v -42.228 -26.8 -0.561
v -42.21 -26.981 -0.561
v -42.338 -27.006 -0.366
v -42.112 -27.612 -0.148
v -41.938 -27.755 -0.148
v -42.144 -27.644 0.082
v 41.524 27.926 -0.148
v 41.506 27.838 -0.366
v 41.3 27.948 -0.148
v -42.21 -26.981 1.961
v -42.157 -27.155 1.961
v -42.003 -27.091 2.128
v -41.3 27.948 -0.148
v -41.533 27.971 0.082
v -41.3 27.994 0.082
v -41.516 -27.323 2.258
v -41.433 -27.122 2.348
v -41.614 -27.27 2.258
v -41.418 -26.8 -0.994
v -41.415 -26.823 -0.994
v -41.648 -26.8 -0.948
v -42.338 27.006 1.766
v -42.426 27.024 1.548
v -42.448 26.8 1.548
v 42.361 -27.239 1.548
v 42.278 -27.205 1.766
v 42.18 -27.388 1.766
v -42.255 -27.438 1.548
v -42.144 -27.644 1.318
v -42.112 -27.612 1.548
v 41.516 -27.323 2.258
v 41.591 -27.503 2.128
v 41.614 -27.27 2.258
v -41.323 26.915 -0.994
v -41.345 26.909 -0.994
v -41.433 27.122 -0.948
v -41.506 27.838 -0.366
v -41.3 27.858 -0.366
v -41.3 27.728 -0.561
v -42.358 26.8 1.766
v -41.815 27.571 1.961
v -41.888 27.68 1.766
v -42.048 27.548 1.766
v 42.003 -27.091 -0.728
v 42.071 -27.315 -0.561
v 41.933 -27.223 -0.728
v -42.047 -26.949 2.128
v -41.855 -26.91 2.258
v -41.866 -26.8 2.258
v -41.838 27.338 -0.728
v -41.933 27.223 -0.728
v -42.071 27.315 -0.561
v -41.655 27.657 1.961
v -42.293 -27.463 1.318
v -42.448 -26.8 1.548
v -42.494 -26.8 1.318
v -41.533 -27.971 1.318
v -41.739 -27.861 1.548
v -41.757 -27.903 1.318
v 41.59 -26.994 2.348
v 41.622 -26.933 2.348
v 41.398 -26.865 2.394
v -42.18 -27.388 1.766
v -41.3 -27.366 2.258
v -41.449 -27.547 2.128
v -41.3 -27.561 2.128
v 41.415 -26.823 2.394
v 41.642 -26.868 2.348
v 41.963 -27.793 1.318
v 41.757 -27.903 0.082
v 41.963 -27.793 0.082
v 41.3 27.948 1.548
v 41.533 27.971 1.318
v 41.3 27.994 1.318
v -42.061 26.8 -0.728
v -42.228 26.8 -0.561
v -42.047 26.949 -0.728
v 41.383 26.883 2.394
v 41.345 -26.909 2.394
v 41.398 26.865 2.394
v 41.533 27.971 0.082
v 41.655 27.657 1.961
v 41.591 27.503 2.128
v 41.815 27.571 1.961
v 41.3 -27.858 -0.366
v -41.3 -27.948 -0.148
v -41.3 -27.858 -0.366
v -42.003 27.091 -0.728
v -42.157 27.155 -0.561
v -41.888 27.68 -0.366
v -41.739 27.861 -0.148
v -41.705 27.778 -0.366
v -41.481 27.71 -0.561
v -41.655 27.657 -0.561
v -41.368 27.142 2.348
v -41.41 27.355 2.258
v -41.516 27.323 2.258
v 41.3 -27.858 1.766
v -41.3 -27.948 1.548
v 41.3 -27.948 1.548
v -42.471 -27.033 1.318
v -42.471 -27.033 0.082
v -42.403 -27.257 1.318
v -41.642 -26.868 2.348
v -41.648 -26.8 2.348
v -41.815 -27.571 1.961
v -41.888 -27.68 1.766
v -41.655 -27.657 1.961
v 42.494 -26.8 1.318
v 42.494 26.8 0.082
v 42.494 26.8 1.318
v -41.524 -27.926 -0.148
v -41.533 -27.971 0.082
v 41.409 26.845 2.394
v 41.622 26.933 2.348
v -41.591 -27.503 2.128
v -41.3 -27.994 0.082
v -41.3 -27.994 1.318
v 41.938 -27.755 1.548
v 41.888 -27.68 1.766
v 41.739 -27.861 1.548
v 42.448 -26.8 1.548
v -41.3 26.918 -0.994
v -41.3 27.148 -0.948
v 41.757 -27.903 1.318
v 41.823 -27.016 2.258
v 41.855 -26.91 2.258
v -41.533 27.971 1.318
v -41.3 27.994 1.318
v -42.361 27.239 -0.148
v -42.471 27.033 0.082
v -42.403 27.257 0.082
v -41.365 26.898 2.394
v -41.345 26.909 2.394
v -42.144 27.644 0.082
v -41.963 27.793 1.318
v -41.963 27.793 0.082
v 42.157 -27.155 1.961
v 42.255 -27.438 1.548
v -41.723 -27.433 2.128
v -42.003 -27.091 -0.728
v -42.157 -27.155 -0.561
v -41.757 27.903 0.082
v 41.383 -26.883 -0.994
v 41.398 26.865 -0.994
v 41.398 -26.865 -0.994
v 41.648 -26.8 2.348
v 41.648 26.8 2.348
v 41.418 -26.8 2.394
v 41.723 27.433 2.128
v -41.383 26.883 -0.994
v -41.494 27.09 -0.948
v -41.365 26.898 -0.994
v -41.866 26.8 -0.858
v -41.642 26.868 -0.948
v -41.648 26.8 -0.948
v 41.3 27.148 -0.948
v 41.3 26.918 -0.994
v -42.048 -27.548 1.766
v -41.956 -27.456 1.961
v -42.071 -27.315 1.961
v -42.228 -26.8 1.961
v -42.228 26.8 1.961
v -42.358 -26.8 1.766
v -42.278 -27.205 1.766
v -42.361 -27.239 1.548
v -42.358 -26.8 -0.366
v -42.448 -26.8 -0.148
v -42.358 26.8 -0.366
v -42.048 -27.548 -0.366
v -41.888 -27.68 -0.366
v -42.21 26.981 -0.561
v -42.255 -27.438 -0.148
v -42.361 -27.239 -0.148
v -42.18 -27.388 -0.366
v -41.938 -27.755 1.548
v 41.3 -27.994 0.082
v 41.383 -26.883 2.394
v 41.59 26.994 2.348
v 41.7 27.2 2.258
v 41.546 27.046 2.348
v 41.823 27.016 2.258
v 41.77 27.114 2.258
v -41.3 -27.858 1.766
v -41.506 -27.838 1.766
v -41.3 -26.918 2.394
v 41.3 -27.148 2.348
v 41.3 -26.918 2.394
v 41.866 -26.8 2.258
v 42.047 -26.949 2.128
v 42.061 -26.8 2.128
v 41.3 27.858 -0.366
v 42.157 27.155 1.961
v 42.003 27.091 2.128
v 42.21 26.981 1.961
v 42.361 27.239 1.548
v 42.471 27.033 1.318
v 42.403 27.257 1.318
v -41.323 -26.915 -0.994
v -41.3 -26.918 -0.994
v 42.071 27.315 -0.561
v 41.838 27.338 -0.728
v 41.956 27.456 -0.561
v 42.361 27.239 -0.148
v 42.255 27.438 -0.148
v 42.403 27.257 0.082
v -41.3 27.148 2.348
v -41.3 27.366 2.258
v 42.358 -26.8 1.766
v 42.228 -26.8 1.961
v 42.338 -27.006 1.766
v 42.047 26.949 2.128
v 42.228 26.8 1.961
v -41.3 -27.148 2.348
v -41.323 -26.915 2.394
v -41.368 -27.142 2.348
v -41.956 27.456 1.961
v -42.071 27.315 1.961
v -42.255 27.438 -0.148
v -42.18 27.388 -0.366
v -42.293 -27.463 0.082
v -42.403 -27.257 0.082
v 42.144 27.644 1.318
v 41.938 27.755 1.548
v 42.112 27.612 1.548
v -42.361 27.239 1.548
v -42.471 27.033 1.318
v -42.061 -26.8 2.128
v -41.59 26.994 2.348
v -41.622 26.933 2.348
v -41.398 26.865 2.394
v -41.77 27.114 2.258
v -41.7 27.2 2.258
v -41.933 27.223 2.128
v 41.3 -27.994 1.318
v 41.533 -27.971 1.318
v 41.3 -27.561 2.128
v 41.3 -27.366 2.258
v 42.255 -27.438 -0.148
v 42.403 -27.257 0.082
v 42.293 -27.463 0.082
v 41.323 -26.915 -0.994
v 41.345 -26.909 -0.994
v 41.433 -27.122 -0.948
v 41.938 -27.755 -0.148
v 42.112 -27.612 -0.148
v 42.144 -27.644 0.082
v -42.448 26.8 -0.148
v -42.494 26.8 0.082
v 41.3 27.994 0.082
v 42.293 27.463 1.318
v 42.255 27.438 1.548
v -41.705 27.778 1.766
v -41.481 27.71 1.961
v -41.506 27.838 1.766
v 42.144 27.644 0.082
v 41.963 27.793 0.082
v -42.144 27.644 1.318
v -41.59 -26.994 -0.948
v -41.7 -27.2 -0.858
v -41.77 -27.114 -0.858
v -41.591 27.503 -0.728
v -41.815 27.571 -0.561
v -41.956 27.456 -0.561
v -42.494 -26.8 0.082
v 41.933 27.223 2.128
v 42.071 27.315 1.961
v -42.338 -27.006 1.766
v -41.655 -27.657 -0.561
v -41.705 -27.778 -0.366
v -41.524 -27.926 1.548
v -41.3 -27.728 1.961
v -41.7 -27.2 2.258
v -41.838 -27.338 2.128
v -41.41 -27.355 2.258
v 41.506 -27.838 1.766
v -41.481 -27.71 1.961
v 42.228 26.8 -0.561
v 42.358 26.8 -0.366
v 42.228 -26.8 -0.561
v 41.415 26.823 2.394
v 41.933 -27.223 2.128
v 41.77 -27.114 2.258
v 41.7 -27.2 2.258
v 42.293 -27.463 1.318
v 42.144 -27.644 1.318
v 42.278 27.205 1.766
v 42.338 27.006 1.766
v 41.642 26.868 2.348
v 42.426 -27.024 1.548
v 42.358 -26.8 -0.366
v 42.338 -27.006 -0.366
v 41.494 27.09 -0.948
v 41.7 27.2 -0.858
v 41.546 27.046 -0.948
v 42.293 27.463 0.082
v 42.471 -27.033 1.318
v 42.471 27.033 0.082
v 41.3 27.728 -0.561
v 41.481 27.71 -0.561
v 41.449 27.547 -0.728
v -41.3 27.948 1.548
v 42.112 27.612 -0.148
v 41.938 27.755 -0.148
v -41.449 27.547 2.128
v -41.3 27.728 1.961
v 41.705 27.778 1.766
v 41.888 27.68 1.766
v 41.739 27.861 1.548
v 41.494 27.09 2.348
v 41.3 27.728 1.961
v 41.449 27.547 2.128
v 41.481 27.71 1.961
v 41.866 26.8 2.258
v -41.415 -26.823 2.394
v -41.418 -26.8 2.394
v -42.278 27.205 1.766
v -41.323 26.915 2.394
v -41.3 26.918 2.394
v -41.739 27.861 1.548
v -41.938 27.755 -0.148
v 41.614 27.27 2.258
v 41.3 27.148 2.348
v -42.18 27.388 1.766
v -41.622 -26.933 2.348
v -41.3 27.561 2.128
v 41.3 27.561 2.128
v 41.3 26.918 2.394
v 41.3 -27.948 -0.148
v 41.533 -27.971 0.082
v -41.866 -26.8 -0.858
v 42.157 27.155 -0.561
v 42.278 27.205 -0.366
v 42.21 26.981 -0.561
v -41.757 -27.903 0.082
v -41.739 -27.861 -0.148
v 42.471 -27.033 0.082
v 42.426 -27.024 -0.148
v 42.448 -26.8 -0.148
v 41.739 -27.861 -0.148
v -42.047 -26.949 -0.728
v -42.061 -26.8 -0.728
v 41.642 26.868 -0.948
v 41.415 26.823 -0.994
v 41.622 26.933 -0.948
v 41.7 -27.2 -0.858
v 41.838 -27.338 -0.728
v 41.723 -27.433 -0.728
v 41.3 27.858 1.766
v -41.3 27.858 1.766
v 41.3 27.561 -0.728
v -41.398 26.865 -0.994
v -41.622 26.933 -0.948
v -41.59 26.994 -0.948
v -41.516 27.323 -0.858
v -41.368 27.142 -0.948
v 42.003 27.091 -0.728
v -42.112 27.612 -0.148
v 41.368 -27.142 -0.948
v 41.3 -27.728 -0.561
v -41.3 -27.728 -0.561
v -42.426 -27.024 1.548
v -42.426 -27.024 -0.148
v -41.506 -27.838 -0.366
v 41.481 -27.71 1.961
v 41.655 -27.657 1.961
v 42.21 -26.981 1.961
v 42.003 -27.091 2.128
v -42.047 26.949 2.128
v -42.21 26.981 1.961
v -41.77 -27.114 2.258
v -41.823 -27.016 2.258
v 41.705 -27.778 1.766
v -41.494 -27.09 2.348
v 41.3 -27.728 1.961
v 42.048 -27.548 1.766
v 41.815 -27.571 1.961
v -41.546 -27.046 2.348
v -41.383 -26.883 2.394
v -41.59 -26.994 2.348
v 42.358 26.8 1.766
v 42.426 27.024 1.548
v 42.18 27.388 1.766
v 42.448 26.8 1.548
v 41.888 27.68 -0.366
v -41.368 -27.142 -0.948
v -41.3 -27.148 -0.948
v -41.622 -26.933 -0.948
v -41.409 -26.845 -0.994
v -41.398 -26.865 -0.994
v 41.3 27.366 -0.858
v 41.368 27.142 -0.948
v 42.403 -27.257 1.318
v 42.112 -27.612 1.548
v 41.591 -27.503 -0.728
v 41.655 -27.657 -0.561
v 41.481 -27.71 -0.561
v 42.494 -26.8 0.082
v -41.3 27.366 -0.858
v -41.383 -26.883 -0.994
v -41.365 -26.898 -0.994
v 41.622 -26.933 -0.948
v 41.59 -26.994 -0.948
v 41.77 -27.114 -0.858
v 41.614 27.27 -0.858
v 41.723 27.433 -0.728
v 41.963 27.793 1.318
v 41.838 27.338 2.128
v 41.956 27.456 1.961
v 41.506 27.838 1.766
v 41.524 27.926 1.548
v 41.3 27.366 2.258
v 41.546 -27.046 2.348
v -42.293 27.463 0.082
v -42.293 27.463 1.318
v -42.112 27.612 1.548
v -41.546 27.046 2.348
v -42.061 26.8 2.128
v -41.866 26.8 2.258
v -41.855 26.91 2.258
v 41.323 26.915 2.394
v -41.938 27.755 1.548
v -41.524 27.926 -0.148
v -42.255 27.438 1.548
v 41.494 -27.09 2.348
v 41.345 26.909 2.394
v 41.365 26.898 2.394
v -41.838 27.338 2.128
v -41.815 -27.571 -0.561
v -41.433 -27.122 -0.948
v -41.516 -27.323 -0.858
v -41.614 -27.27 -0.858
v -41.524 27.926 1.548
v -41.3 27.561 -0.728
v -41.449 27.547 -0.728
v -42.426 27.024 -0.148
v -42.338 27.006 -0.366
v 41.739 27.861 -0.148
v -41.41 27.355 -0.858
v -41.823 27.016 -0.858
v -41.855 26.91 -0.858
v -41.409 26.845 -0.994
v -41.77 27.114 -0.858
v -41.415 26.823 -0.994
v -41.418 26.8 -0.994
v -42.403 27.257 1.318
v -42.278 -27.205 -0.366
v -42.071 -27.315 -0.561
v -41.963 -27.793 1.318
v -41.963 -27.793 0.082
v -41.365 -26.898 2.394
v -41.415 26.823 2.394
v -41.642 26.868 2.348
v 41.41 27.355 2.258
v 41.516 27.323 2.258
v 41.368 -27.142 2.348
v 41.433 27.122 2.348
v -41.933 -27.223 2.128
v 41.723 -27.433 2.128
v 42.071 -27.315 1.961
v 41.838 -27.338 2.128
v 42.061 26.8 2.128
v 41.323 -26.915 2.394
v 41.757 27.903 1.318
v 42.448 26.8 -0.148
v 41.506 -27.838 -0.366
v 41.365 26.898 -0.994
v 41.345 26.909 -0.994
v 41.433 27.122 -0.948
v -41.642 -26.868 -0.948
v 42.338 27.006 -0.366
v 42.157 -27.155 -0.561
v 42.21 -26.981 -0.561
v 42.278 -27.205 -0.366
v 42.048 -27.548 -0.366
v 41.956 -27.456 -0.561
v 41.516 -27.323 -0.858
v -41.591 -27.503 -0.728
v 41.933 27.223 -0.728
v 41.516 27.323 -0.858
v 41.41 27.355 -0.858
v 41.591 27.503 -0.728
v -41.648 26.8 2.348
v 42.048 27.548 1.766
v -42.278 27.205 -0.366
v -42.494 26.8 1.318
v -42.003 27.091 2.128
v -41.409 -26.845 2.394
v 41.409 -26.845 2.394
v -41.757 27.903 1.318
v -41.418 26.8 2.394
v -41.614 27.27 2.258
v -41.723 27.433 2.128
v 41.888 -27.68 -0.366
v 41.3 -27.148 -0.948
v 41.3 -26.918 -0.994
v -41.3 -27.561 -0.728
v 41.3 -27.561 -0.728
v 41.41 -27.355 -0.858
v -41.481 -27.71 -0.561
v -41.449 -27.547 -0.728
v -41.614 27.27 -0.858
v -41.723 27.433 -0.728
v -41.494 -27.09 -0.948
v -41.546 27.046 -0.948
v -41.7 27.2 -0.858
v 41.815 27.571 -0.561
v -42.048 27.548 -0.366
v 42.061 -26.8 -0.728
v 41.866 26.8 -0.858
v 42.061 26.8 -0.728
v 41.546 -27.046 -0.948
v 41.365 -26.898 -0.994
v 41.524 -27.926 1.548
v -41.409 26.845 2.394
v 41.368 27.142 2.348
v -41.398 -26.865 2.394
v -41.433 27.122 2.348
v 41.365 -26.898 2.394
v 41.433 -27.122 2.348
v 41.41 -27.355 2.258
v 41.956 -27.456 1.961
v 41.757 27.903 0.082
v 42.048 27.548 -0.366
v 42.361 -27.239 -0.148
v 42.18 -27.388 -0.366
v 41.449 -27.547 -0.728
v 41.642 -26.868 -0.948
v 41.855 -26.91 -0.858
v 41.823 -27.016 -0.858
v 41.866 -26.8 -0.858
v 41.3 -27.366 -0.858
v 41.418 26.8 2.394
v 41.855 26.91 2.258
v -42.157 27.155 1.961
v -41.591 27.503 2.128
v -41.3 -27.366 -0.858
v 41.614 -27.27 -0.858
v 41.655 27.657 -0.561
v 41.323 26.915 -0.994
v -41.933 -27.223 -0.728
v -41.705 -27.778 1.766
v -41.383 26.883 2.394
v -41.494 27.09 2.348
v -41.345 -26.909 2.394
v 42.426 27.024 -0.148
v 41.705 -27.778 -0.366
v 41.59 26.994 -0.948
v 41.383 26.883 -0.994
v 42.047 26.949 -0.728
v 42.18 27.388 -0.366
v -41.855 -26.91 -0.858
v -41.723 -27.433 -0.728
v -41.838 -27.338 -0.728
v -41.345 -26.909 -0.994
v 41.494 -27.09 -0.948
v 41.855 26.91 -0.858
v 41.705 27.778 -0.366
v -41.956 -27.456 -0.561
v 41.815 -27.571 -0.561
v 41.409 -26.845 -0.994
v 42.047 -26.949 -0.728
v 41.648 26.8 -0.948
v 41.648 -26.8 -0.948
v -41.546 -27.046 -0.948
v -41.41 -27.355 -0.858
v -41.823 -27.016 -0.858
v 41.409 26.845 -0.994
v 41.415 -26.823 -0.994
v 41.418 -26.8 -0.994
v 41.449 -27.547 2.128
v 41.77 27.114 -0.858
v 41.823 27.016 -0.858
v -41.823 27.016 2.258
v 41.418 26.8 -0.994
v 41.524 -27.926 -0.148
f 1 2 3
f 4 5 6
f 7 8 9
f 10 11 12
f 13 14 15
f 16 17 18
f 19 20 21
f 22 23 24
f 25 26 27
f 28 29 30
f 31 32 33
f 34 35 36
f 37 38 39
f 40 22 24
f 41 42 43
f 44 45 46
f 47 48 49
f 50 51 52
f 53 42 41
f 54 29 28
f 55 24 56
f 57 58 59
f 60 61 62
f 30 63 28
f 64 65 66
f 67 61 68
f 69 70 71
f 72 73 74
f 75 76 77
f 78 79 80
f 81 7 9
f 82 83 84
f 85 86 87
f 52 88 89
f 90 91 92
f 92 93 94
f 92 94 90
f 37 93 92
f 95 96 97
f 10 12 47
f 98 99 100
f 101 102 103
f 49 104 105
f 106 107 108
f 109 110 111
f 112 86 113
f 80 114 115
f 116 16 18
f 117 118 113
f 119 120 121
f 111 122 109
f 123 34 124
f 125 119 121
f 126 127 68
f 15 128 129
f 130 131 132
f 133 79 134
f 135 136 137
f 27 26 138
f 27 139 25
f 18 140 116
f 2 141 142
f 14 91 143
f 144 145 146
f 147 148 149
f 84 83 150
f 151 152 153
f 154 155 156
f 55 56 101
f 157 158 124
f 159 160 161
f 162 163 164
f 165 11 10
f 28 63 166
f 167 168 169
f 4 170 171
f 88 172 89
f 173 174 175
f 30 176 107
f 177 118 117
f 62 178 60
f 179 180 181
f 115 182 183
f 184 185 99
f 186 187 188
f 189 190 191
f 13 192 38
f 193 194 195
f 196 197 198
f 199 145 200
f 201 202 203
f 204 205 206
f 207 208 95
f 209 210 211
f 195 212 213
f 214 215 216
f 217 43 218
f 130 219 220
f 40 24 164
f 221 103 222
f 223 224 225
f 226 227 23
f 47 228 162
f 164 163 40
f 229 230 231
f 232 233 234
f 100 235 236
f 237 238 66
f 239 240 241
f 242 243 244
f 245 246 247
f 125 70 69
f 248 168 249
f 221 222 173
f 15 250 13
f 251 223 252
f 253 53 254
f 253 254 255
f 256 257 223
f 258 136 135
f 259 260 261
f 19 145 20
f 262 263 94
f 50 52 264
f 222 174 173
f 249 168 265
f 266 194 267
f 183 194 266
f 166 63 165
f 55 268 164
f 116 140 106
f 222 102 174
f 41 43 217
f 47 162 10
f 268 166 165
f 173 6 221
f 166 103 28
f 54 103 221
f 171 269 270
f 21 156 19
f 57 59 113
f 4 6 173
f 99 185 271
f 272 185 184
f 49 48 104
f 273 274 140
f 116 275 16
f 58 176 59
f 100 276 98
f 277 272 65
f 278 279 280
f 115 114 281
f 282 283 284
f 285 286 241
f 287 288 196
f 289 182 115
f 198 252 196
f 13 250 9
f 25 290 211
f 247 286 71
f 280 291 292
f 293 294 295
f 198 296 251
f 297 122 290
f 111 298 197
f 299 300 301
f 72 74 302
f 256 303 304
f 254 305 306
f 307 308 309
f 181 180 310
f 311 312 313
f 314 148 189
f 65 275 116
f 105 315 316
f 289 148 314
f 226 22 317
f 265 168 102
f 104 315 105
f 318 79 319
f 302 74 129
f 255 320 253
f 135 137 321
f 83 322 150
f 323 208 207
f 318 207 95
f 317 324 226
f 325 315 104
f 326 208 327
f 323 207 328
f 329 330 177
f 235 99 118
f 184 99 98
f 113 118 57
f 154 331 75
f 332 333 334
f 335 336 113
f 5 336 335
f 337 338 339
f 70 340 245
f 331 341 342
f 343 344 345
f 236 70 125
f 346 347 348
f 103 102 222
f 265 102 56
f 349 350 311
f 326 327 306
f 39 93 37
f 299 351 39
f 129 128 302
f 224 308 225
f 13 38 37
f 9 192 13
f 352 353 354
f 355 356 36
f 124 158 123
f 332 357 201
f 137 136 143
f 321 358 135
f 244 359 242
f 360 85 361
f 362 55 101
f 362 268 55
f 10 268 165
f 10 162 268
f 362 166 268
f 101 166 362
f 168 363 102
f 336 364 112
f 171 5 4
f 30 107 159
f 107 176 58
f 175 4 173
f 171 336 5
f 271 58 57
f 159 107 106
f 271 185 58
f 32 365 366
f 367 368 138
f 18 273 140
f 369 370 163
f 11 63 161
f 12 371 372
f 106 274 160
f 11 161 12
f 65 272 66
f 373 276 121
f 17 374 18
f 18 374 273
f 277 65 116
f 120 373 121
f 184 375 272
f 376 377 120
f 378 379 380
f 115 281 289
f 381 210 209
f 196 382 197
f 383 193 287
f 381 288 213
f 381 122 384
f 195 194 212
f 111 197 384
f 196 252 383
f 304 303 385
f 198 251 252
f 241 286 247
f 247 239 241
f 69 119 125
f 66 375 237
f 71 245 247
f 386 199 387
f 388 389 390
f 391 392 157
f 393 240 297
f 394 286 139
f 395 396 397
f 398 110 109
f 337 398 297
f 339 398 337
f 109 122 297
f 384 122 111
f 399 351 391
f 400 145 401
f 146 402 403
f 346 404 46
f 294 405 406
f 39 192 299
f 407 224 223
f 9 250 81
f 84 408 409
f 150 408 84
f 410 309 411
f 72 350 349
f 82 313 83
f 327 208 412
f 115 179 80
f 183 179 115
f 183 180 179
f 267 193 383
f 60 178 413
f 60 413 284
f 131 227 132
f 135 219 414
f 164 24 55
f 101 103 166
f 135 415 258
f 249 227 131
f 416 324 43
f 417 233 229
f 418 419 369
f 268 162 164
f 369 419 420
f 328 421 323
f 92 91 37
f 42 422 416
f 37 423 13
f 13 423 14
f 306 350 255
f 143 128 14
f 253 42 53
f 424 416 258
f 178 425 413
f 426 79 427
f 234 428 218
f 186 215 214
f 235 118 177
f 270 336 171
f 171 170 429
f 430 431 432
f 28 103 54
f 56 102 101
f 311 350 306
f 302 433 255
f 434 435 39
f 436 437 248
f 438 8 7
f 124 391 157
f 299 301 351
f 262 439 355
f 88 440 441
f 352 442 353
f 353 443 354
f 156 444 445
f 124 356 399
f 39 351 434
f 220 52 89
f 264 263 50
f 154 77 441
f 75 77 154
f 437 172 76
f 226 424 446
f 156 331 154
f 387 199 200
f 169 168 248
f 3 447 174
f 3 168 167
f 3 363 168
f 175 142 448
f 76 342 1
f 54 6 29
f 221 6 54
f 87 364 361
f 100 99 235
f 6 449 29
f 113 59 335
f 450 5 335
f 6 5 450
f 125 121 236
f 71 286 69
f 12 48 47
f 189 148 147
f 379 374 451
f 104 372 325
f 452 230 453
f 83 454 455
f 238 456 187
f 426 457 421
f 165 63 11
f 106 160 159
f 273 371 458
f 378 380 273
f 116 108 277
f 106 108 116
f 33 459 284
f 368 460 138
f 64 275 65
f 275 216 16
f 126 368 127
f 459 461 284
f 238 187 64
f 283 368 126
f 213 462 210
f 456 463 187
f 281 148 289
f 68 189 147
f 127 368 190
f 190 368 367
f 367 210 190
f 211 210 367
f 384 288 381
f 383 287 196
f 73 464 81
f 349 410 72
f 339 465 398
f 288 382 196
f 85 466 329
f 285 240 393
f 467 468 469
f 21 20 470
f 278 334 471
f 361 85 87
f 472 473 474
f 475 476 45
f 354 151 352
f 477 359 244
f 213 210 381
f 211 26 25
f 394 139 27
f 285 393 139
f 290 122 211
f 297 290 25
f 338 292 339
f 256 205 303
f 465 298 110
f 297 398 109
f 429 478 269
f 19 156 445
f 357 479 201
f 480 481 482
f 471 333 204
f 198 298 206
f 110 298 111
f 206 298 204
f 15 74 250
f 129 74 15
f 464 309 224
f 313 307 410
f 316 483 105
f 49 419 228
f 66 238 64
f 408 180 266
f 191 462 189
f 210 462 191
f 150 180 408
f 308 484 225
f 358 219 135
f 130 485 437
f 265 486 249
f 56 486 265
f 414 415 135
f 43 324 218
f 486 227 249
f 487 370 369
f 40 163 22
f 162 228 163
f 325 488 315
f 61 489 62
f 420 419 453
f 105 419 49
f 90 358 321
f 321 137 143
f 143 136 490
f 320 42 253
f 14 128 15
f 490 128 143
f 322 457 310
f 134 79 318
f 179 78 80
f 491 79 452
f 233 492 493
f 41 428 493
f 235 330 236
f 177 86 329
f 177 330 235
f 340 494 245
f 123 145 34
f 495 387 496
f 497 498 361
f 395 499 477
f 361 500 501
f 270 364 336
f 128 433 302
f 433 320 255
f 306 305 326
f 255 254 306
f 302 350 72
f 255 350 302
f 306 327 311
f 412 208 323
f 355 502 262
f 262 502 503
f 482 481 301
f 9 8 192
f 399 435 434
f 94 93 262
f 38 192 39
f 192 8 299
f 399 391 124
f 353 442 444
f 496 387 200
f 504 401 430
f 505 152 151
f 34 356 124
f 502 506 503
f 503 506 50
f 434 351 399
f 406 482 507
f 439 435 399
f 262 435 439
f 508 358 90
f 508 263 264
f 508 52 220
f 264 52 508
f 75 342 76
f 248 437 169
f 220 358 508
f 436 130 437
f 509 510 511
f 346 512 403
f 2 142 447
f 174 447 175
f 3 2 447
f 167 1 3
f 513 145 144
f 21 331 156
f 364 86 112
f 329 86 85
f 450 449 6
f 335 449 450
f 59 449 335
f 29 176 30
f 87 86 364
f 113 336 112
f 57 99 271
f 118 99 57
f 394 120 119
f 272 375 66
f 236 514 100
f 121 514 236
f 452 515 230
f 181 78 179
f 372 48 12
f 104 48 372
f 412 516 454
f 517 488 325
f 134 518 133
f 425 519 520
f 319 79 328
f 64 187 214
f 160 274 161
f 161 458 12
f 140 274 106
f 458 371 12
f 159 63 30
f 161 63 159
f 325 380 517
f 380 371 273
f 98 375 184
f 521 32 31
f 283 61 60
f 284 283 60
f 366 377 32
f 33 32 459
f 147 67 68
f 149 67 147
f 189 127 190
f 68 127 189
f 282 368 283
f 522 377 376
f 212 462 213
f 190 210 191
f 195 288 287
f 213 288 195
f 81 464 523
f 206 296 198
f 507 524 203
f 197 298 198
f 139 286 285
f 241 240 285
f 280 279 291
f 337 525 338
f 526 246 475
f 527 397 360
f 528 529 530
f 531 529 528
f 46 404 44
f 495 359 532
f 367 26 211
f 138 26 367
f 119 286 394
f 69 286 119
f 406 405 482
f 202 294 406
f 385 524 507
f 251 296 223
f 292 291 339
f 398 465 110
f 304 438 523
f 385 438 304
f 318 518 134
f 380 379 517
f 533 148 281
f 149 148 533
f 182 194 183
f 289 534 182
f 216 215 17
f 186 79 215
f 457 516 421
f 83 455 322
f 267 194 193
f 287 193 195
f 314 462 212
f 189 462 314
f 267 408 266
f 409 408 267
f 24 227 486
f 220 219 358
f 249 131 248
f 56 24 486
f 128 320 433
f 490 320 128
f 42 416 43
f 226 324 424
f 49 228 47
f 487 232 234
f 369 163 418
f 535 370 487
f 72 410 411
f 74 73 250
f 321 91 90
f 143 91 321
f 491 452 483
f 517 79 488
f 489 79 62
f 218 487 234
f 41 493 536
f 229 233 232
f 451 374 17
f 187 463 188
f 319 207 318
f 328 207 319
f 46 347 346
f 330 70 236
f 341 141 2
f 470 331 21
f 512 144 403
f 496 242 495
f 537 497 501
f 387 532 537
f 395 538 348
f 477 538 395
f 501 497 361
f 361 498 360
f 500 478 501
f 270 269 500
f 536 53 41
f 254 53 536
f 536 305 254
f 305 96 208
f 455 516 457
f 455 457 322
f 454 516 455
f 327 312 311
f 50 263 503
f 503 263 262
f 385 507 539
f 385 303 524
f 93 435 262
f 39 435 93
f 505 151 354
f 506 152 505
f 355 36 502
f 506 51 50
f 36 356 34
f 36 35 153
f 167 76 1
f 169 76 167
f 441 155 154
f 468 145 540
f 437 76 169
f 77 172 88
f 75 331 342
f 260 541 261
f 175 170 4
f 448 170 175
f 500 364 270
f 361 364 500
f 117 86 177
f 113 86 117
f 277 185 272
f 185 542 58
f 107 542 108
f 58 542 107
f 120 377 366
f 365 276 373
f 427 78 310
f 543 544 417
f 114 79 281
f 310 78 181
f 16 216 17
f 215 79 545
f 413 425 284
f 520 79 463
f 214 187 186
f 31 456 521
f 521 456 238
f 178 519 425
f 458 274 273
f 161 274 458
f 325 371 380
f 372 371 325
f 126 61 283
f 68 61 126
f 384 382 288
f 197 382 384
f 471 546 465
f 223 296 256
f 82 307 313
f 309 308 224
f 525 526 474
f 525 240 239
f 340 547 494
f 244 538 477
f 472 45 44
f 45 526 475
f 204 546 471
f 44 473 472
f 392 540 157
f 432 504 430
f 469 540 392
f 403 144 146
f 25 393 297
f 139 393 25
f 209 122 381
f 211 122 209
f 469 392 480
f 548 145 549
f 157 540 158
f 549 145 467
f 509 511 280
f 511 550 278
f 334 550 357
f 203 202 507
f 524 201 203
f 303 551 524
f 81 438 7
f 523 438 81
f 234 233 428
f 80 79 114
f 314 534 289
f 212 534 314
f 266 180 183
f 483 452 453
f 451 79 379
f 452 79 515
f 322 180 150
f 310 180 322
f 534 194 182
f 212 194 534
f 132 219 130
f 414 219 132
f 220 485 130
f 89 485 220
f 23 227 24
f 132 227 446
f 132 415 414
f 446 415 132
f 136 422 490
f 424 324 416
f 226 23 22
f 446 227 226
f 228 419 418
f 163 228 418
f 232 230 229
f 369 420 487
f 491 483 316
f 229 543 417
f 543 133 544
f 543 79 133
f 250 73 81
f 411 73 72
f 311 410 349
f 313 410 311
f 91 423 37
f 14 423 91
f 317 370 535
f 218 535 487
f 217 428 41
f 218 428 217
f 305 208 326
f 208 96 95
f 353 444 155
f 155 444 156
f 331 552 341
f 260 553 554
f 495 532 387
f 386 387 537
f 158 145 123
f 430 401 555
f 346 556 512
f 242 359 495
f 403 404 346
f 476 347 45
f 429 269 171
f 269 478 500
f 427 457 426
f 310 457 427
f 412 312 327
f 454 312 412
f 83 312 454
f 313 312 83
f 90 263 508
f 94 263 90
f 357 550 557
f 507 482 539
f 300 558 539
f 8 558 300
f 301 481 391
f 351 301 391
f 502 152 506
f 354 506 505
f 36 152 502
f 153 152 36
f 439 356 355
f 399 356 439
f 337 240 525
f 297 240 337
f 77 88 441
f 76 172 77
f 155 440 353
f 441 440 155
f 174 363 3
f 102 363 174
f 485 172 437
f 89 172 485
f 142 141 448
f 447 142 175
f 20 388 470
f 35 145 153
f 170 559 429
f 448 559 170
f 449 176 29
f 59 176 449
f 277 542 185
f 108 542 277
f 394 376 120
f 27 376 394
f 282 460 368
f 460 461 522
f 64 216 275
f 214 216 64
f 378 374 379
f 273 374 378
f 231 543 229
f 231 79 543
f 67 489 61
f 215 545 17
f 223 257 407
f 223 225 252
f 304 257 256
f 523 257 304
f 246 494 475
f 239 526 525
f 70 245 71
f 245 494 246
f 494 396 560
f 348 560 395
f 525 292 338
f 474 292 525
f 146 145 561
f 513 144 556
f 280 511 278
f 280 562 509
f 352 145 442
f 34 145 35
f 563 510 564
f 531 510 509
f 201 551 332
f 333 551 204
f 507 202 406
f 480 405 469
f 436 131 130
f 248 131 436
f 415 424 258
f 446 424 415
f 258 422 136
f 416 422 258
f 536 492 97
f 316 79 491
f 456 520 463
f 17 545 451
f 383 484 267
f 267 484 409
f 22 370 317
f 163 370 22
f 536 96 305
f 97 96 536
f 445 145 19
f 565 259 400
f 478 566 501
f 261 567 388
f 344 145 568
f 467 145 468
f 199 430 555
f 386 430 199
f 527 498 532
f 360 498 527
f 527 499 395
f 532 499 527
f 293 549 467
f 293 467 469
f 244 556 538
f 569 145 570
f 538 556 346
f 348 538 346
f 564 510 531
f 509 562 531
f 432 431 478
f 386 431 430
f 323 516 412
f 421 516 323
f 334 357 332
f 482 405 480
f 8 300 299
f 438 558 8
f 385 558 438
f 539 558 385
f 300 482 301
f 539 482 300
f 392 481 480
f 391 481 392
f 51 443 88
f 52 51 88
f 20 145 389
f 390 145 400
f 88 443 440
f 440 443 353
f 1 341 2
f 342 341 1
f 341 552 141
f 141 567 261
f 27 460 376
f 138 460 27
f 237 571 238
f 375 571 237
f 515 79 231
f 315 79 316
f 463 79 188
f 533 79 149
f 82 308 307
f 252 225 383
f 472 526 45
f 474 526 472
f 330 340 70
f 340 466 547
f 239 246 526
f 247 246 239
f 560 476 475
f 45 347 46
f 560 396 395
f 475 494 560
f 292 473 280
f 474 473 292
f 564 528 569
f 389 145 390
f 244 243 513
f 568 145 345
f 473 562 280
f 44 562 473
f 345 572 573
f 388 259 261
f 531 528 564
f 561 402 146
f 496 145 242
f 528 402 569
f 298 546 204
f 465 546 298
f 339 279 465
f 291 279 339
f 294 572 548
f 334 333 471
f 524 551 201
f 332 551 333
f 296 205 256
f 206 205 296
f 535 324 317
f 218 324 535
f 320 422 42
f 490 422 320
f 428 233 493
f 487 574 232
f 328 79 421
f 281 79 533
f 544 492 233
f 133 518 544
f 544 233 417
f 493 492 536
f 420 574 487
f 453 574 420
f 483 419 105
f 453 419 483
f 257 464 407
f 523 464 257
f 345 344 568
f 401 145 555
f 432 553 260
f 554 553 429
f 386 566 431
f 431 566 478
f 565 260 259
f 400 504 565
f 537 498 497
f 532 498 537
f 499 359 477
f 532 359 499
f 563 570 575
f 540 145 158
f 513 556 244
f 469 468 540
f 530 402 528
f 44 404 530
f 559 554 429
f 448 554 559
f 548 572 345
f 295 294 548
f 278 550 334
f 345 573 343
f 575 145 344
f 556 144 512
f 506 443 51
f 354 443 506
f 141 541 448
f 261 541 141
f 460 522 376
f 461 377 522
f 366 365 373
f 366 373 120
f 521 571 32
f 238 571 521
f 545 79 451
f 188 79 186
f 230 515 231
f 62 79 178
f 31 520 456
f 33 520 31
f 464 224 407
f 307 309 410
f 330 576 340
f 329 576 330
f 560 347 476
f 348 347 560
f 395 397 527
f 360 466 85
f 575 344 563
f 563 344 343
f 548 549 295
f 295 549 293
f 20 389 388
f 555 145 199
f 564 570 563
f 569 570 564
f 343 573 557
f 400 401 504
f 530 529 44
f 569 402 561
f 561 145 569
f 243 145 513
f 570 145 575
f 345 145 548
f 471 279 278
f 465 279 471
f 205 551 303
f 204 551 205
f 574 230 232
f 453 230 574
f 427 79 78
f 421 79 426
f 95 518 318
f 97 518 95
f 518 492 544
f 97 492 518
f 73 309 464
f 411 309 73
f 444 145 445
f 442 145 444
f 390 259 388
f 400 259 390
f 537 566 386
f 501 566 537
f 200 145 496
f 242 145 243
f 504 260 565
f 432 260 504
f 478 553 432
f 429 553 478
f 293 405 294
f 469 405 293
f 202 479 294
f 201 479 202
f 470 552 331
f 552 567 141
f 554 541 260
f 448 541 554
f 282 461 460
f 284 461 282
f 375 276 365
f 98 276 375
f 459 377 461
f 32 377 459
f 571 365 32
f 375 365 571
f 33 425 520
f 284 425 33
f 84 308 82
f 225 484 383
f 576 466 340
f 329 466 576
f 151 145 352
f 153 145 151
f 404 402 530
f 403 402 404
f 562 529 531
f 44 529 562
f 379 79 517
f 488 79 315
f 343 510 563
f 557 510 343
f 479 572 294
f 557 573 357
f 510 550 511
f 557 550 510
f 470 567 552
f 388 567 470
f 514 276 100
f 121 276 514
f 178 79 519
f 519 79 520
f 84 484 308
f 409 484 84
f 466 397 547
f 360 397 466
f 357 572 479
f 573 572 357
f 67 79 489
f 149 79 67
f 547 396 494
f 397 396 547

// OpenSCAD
// Raspberry Pi 4B (Raspberry Pi 4B) visual source for NexCAD.
// Units: millimeters. Origin: part bottom-center, matching src/parts/library.ts.
// This generated baseline is intentionally simple; refine it with measured details before exporting STL.

$fn = 32;

module rounded_box(size, r = 0.8) {
  hull() {
    for (x = [-size[0] / 2 + r, size[0] / 2 - r])
      for (y = [-size[1] / 2 + r, size[1] / 2 - r]) {
        translate([x, y, r]) sphere(r = r);
        translate([x, y, size[2] - r]) sphere(r = r);
      }
  }
}

color("#2e7d5b") rounded_box([85, 56, 1.4], min(1.2, min(85, 56) / 8));
